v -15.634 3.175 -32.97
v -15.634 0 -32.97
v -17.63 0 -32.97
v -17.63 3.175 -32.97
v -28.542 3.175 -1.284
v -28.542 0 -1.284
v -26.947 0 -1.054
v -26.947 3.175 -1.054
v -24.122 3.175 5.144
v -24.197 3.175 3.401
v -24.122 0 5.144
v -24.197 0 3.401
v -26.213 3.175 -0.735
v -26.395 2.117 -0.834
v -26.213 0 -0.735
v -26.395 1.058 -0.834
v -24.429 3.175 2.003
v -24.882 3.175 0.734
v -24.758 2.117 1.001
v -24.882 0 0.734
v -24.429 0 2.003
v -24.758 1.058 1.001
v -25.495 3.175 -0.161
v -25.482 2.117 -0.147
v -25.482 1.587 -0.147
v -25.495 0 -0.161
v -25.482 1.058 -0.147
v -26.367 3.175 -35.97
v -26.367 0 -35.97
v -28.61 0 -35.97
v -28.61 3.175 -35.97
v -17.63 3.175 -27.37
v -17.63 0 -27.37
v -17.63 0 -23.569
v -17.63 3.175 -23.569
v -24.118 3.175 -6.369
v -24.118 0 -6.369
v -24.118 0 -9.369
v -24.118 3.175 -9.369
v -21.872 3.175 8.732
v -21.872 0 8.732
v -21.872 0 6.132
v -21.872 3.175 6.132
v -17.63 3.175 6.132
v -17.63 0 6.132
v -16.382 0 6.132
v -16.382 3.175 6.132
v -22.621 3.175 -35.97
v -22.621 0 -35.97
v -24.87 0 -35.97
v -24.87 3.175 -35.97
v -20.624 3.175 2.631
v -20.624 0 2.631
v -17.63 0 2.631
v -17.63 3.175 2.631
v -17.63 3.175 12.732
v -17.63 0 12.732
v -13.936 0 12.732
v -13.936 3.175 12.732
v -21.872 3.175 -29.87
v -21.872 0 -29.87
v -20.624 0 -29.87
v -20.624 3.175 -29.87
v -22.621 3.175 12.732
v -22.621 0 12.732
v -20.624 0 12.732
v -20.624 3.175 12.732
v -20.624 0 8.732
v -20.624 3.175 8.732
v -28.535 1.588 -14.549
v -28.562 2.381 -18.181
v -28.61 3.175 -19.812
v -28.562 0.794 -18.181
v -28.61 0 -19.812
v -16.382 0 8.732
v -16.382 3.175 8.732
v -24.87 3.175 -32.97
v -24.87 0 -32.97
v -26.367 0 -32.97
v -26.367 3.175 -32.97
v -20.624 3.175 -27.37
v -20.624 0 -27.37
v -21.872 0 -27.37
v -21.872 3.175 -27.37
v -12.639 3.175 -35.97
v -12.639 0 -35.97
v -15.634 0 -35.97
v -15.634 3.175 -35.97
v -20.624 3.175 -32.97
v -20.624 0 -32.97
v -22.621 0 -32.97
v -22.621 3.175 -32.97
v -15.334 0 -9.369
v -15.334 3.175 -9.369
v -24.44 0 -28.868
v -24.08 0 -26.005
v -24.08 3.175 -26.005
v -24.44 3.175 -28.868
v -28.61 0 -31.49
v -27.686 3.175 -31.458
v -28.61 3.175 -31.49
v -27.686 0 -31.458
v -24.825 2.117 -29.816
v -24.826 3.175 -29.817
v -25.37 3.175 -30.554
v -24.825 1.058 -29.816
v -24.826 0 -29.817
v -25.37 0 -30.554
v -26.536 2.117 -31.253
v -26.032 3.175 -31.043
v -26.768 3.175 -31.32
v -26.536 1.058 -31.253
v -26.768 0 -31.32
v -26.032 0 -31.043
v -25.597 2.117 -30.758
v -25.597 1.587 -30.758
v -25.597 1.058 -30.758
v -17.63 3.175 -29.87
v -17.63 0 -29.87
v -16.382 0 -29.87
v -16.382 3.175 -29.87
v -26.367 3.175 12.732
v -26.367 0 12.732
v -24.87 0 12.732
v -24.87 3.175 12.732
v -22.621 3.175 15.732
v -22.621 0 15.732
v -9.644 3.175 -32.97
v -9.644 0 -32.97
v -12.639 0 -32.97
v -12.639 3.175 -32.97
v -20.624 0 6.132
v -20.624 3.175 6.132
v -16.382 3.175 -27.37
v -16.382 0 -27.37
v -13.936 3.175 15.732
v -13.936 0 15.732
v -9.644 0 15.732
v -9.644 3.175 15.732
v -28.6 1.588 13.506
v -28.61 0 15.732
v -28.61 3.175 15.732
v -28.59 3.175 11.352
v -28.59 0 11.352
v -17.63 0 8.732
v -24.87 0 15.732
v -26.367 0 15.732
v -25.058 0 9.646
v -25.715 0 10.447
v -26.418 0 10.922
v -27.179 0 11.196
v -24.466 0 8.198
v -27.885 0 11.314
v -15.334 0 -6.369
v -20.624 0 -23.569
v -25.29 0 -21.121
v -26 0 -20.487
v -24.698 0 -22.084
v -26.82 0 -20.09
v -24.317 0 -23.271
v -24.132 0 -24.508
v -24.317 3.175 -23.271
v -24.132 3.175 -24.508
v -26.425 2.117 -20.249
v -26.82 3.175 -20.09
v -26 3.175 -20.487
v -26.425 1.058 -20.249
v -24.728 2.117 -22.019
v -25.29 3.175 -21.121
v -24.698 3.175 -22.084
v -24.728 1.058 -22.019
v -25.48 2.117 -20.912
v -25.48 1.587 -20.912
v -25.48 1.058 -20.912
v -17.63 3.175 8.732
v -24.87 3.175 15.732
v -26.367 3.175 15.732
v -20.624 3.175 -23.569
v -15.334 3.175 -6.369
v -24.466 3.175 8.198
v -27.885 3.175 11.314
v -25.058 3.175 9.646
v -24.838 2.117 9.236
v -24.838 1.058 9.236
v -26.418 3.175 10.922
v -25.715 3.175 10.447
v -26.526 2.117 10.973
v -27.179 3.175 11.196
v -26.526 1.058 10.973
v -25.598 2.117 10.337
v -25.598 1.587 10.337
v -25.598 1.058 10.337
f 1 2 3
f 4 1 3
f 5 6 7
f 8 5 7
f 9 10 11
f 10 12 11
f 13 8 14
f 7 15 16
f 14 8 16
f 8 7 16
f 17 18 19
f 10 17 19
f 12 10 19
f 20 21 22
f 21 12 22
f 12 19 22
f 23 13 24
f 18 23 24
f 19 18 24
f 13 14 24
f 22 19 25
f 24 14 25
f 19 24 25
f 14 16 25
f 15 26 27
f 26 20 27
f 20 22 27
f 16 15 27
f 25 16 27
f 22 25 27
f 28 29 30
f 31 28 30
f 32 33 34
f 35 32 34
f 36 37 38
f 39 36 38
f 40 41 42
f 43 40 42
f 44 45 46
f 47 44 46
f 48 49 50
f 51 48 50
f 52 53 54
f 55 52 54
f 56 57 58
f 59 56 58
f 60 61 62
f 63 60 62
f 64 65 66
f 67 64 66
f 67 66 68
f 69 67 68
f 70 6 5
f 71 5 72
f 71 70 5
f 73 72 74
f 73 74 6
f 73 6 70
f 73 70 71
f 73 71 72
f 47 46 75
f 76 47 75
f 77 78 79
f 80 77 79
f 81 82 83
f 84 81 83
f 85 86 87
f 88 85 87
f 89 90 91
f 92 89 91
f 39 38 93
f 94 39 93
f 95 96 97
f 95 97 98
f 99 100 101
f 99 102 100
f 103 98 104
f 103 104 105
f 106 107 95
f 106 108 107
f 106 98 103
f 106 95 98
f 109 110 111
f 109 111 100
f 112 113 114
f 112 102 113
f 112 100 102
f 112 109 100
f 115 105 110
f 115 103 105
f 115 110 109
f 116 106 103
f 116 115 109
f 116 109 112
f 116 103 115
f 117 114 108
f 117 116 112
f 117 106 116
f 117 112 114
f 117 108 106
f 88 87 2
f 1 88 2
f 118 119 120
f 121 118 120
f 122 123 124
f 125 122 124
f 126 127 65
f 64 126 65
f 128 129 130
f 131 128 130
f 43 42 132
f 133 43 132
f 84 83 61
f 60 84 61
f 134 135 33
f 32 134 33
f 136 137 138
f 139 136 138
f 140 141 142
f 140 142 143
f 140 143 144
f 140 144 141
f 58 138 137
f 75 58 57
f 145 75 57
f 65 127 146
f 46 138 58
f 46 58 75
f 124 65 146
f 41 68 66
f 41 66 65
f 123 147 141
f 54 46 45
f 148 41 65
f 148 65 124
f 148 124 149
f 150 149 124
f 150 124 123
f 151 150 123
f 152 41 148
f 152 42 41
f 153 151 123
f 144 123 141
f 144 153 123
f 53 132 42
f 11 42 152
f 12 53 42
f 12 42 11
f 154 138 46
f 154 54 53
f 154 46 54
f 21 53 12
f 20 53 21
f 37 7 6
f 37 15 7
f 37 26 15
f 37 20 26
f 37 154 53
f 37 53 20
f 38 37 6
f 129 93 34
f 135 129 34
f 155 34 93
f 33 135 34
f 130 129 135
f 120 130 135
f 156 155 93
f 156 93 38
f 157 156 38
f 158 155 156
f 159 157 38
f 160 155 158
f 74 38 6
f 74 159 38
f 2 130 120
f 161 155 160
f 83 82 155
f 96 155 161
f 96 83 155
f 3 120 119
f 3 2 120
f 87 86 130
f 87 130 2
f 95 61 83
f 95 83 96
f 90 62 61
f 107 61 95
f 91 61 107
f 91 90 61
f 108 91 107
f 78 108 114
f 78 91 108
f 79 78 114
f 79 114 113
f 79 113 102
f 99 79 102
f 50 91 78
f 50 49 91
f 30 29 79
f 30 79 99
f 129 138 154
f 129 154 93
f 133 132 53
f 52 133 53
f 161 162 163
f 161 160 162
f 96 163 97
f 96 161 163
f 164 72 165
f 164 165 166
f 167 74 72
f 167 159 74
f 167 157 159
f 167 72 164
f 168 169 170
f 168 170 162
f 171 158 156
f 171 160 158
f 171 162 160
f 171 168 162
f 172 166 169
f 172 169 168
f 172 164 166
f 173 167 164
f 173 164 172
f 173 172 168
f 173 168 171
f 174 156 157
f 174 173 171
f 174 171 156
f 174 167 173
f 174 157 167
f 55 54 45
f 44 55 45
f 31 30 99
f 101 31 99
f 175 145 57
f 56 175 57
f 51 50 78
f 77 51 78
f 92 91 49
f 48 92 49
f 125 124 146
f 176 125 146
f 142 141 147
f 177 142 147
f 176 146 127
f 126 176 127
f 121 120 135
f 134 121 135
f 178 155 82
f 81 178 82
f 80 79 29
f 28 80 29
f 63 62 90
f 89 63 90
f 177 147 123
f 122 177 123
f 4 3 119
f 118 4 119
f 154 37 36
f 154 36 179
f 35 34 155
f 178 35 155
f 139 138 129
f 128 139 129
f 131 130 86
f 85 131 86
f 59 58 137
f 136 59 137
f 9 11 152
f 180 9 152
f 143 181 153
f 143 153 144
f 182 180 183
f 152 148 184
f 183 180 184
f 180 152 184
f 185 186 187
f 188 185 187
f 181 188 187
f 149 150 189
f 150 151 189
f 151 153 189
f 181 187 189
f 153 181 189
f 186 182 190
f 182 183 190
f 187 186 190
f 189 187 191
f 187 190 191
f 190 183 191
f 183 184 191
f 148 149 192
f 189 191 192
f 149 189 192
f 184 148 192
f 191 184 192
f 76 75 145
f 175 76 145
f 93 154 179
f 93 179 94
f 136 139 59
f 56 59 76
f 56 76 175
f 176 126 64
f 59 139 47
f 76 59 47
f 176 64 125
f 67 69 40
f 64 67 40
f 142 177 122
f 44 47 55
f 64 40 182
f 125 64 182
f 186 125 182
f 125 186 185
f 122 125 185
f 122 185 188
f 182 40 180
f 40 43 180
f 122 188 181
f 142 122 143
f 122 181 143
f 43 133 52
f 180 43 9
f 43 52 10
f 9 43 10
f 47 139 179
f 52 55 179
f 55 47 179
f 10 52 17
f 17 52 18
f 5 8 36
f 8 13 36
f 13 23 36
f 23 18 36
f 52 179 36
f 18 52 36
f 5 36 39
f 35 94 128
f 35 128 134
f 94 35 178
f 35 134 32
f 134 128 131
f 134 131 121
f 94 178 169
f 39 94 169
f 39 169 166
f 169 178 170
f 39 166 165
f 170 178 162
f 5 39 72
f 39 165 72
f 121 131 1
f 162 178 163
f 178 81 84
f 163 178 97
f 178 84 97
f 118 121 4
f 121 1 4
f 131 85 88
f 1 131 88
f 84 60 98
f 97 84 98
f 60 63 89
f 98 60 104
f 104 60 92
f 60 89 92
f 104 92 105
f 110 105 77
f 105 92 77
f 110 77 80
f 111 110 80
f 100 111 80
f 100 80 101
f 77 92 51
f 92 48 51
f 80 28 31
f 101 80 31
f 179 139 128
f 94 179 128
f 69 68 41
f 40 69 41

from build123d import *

# Parameters (mm, degrees)
SKETCH1_W           = 8.784371833
SKETCH1_H           = 3.000075643
BOSS_EXTRUDE1_DEPTH = 3.175


with BuildPart() as part:
    # Sketch1 → Boss-Extrude1 (new body)
    with BuildSketch(Plane(origin=(0, 0, 0), x_dir=(1, 0, 0), z_dir=(0, 1, 0))):
        with BuildLine():
            add(Edge.make_bspline(
                [(-28.61031783, -15.731991288), (-28.599265415, -13.470035002), (-28.589694066, -11.351623557)],
                knots=[4, 4, 4, 4.067001907, 4.067001907, 4.067001907], degree=2))
            Line((-28.61031783, -15.731991288), (-26.367380226, -15.731991288))
            Line((-26.367380226, -15.731991288), (-26.367380226, -12.731847281))
            Line((-26.367380226, -12.731847281), (-24.870018528, -12.731847281))
            Line((-24.870018528, -12.731847281), (-24.870018528, -15.731991288))
            Line((-24.870018528, -15.731991288), (-22.620949028, -15.731991288))
            Line((-22.620949028, -15.731991288), (-22.620949028, -12.731847281))
            Line((-22.620949028, -12.731847281), (-20.62449601, -12.731847281))
            Line((-20.62449601, -12.731847281), (-20.62449601, -8.731700034))
            Line((-20.62449601, -8.731700034), (-21.872234059, -8.731700034))
            Line((-21.872234059, -8.731700034), (-21.872234059, -8.631722416))
            Line((-21.872234059, -8.631722416), (-21.872234059, -6.131583692))
            Line((-21.872234059, -6.131583692), (-20.62449601, -6.131583692))
            Line((-20.62449601, -6.131583692), (-20.62449601, -2.631434402))
            Line((-20.62449601, -2.631434402), (-17.629967586, -2.631434402))
            Line((-17.629967586, -2.631434402), (-17.629967586, -6.131583692))
            Line((-17.629967586, -6.131583692), (-16.382151548, -6.131583692))
            Line((-16.382151548, -6.131583692), (-16.382151548, -8.631722416))
            Line((-16.382151548, -8.631722416), (-16.382151548, -8.731700034))
            Line((-16.382151548, -8.731700034), (-17.629967586, -8.731700034))
            Line((-17.629967586, -8.731700034), (-17.629967586, -12.731847281))
            Line((-17.629967586, -12.731847281), (-13.936374012, -12.731847281))
            Line((-13.936374012, -12.731847281), (-13.936374012, -15.731991288))
            Line((-13.936374012, -15.731991288), (-9.644077522, -15.731991288))
            Line((-9.644077522, -15.731991288), (-9.644077522, 32.969811886))
            Line((-9.644077522, 32.969811886), (-12.638791169, 32.969811886))
            Line((-12.638791169, 32.969811886), (-12.638791169, 35.969951009))
            Line((-12.638791169, 35.969951009), (-15.633504817, 35.969951009))
            Line((-15.633504817, 35.969951009), (-15.633504817, 32.969811886))
            Line((-15.633504817, 32.969811886), (-17.629967584, 32.969811886))
            Line((-17.629967584, 32.969811886), (-17.629967584, 29.869690261))
            Line((-17.629967584, 29.869690261), (-16.382151546, 29.869690261))
            Line((-16.382151546, 29.869690261), (-16.382151546, 27.369615017))
            Line((-16.382151546, 27.369615017), (-17.629967584, 27.369615017))
            Line((-17.629967584, 27.369615017), (-17.629967584, 23.569352199))
            Line((-17.629967584, 23.569352199), (-20.624496008, 23.569352199))
            Line((-20.624496008, 23.569352199), (-20.624496008, 27.369615017))
            Line((-20.624496008, 27.369615017), (-21.872234057, 27.369615017))
            Line((-21.872234057, 27.369615017), (-21.872234057, 29.869690261))
            Line((-21.872234057, 29.869690261), (-20.624496008, 29.869690261))
            Line((-20.624496008, 29.869690261), (-20.624496008, 32.969811886))
            Line((-20.624496008, 32.969811886), (-22.620949026, 32.969811886))
            Line((-22.620949026, 32.969811886), (-22.620949026, 35.969951009))
            Line((-22.620949026, 35.969951009), (-24.870018526, 35.969951009))
            Line((-24.870018526, 35.969951009), (-24.870018526, 32.969811886))
            Line((-24.870018526, 32.969811886), (-26.367380224, 32.969811886))
            Line((-26.367380224, 32.969811886), (-26.367380224, 35.969951009))
            Line((-26.367380224, 35.969951009), (-28.610317827, 35.969951009))
            Line((-28.610317827, 35.969951009), (-28.610317827, 31.489897526))
            add(Edge.make_bspline(
                [(-24.079715861, 26.005231108), (-24.142399609, 31.393191619), (-26.553744953, 31.462825341), (-28.610317827, 31.489897526)],
                knots=[6, 6, 6, 6, 7, 7, 7, 7], degree=3))
            add(Edge.make_bspline(
                [(-28.610317828, 19.811970764), (-26.367380222, 19.876359983), (-24.017041861, 20.617148519), (-24.079715861, 26.005231108)],
                knots=[5, 5, 5, 5, 6, 6, 6, 6], degree=3))
            add(Edge.make_bspline(
                [(-28.542036738, 1.284383122), (-28.493620066, 18.549619675), (-28.610317828, 19.811970764)],
                knots=[4.292555269, 4.292555269, 4.292555269, 5, 5, 5], degree=2))
            add(Edge.make_bspline(
                [(-28.542036738, 1.284383122), (-26.304598455, 1.216834034), (-24.092636702, 0.462074592), (-24.122268671, -5.143929938)],
                knots=[1.002428408, 1.002428408, 1.002428408, 1.002428408, 2, 2, 2, 2], degree=3))
            add(Edge.make_bspline(
                [(-24.122268671, -5.143929938), (-24.151883253, -10.744553605), (-26.537723417, -11.321030016), (-28.589694066, -11.351623557)],
                knots=[2, 2, 2, 2, 2.996659117, 2.996659117, 2.996659117, 2.996659117], degree=3))
        make_face()
        with Locations((-19.726124806, 7.868969519)):
            Rectangle(SKETCH1_W, SKETCH1_H, mode=Mode.SUBTRACT)
    extrude(amount=BOSS_EXTRUDE1_DEPTH)


solid = part.part
